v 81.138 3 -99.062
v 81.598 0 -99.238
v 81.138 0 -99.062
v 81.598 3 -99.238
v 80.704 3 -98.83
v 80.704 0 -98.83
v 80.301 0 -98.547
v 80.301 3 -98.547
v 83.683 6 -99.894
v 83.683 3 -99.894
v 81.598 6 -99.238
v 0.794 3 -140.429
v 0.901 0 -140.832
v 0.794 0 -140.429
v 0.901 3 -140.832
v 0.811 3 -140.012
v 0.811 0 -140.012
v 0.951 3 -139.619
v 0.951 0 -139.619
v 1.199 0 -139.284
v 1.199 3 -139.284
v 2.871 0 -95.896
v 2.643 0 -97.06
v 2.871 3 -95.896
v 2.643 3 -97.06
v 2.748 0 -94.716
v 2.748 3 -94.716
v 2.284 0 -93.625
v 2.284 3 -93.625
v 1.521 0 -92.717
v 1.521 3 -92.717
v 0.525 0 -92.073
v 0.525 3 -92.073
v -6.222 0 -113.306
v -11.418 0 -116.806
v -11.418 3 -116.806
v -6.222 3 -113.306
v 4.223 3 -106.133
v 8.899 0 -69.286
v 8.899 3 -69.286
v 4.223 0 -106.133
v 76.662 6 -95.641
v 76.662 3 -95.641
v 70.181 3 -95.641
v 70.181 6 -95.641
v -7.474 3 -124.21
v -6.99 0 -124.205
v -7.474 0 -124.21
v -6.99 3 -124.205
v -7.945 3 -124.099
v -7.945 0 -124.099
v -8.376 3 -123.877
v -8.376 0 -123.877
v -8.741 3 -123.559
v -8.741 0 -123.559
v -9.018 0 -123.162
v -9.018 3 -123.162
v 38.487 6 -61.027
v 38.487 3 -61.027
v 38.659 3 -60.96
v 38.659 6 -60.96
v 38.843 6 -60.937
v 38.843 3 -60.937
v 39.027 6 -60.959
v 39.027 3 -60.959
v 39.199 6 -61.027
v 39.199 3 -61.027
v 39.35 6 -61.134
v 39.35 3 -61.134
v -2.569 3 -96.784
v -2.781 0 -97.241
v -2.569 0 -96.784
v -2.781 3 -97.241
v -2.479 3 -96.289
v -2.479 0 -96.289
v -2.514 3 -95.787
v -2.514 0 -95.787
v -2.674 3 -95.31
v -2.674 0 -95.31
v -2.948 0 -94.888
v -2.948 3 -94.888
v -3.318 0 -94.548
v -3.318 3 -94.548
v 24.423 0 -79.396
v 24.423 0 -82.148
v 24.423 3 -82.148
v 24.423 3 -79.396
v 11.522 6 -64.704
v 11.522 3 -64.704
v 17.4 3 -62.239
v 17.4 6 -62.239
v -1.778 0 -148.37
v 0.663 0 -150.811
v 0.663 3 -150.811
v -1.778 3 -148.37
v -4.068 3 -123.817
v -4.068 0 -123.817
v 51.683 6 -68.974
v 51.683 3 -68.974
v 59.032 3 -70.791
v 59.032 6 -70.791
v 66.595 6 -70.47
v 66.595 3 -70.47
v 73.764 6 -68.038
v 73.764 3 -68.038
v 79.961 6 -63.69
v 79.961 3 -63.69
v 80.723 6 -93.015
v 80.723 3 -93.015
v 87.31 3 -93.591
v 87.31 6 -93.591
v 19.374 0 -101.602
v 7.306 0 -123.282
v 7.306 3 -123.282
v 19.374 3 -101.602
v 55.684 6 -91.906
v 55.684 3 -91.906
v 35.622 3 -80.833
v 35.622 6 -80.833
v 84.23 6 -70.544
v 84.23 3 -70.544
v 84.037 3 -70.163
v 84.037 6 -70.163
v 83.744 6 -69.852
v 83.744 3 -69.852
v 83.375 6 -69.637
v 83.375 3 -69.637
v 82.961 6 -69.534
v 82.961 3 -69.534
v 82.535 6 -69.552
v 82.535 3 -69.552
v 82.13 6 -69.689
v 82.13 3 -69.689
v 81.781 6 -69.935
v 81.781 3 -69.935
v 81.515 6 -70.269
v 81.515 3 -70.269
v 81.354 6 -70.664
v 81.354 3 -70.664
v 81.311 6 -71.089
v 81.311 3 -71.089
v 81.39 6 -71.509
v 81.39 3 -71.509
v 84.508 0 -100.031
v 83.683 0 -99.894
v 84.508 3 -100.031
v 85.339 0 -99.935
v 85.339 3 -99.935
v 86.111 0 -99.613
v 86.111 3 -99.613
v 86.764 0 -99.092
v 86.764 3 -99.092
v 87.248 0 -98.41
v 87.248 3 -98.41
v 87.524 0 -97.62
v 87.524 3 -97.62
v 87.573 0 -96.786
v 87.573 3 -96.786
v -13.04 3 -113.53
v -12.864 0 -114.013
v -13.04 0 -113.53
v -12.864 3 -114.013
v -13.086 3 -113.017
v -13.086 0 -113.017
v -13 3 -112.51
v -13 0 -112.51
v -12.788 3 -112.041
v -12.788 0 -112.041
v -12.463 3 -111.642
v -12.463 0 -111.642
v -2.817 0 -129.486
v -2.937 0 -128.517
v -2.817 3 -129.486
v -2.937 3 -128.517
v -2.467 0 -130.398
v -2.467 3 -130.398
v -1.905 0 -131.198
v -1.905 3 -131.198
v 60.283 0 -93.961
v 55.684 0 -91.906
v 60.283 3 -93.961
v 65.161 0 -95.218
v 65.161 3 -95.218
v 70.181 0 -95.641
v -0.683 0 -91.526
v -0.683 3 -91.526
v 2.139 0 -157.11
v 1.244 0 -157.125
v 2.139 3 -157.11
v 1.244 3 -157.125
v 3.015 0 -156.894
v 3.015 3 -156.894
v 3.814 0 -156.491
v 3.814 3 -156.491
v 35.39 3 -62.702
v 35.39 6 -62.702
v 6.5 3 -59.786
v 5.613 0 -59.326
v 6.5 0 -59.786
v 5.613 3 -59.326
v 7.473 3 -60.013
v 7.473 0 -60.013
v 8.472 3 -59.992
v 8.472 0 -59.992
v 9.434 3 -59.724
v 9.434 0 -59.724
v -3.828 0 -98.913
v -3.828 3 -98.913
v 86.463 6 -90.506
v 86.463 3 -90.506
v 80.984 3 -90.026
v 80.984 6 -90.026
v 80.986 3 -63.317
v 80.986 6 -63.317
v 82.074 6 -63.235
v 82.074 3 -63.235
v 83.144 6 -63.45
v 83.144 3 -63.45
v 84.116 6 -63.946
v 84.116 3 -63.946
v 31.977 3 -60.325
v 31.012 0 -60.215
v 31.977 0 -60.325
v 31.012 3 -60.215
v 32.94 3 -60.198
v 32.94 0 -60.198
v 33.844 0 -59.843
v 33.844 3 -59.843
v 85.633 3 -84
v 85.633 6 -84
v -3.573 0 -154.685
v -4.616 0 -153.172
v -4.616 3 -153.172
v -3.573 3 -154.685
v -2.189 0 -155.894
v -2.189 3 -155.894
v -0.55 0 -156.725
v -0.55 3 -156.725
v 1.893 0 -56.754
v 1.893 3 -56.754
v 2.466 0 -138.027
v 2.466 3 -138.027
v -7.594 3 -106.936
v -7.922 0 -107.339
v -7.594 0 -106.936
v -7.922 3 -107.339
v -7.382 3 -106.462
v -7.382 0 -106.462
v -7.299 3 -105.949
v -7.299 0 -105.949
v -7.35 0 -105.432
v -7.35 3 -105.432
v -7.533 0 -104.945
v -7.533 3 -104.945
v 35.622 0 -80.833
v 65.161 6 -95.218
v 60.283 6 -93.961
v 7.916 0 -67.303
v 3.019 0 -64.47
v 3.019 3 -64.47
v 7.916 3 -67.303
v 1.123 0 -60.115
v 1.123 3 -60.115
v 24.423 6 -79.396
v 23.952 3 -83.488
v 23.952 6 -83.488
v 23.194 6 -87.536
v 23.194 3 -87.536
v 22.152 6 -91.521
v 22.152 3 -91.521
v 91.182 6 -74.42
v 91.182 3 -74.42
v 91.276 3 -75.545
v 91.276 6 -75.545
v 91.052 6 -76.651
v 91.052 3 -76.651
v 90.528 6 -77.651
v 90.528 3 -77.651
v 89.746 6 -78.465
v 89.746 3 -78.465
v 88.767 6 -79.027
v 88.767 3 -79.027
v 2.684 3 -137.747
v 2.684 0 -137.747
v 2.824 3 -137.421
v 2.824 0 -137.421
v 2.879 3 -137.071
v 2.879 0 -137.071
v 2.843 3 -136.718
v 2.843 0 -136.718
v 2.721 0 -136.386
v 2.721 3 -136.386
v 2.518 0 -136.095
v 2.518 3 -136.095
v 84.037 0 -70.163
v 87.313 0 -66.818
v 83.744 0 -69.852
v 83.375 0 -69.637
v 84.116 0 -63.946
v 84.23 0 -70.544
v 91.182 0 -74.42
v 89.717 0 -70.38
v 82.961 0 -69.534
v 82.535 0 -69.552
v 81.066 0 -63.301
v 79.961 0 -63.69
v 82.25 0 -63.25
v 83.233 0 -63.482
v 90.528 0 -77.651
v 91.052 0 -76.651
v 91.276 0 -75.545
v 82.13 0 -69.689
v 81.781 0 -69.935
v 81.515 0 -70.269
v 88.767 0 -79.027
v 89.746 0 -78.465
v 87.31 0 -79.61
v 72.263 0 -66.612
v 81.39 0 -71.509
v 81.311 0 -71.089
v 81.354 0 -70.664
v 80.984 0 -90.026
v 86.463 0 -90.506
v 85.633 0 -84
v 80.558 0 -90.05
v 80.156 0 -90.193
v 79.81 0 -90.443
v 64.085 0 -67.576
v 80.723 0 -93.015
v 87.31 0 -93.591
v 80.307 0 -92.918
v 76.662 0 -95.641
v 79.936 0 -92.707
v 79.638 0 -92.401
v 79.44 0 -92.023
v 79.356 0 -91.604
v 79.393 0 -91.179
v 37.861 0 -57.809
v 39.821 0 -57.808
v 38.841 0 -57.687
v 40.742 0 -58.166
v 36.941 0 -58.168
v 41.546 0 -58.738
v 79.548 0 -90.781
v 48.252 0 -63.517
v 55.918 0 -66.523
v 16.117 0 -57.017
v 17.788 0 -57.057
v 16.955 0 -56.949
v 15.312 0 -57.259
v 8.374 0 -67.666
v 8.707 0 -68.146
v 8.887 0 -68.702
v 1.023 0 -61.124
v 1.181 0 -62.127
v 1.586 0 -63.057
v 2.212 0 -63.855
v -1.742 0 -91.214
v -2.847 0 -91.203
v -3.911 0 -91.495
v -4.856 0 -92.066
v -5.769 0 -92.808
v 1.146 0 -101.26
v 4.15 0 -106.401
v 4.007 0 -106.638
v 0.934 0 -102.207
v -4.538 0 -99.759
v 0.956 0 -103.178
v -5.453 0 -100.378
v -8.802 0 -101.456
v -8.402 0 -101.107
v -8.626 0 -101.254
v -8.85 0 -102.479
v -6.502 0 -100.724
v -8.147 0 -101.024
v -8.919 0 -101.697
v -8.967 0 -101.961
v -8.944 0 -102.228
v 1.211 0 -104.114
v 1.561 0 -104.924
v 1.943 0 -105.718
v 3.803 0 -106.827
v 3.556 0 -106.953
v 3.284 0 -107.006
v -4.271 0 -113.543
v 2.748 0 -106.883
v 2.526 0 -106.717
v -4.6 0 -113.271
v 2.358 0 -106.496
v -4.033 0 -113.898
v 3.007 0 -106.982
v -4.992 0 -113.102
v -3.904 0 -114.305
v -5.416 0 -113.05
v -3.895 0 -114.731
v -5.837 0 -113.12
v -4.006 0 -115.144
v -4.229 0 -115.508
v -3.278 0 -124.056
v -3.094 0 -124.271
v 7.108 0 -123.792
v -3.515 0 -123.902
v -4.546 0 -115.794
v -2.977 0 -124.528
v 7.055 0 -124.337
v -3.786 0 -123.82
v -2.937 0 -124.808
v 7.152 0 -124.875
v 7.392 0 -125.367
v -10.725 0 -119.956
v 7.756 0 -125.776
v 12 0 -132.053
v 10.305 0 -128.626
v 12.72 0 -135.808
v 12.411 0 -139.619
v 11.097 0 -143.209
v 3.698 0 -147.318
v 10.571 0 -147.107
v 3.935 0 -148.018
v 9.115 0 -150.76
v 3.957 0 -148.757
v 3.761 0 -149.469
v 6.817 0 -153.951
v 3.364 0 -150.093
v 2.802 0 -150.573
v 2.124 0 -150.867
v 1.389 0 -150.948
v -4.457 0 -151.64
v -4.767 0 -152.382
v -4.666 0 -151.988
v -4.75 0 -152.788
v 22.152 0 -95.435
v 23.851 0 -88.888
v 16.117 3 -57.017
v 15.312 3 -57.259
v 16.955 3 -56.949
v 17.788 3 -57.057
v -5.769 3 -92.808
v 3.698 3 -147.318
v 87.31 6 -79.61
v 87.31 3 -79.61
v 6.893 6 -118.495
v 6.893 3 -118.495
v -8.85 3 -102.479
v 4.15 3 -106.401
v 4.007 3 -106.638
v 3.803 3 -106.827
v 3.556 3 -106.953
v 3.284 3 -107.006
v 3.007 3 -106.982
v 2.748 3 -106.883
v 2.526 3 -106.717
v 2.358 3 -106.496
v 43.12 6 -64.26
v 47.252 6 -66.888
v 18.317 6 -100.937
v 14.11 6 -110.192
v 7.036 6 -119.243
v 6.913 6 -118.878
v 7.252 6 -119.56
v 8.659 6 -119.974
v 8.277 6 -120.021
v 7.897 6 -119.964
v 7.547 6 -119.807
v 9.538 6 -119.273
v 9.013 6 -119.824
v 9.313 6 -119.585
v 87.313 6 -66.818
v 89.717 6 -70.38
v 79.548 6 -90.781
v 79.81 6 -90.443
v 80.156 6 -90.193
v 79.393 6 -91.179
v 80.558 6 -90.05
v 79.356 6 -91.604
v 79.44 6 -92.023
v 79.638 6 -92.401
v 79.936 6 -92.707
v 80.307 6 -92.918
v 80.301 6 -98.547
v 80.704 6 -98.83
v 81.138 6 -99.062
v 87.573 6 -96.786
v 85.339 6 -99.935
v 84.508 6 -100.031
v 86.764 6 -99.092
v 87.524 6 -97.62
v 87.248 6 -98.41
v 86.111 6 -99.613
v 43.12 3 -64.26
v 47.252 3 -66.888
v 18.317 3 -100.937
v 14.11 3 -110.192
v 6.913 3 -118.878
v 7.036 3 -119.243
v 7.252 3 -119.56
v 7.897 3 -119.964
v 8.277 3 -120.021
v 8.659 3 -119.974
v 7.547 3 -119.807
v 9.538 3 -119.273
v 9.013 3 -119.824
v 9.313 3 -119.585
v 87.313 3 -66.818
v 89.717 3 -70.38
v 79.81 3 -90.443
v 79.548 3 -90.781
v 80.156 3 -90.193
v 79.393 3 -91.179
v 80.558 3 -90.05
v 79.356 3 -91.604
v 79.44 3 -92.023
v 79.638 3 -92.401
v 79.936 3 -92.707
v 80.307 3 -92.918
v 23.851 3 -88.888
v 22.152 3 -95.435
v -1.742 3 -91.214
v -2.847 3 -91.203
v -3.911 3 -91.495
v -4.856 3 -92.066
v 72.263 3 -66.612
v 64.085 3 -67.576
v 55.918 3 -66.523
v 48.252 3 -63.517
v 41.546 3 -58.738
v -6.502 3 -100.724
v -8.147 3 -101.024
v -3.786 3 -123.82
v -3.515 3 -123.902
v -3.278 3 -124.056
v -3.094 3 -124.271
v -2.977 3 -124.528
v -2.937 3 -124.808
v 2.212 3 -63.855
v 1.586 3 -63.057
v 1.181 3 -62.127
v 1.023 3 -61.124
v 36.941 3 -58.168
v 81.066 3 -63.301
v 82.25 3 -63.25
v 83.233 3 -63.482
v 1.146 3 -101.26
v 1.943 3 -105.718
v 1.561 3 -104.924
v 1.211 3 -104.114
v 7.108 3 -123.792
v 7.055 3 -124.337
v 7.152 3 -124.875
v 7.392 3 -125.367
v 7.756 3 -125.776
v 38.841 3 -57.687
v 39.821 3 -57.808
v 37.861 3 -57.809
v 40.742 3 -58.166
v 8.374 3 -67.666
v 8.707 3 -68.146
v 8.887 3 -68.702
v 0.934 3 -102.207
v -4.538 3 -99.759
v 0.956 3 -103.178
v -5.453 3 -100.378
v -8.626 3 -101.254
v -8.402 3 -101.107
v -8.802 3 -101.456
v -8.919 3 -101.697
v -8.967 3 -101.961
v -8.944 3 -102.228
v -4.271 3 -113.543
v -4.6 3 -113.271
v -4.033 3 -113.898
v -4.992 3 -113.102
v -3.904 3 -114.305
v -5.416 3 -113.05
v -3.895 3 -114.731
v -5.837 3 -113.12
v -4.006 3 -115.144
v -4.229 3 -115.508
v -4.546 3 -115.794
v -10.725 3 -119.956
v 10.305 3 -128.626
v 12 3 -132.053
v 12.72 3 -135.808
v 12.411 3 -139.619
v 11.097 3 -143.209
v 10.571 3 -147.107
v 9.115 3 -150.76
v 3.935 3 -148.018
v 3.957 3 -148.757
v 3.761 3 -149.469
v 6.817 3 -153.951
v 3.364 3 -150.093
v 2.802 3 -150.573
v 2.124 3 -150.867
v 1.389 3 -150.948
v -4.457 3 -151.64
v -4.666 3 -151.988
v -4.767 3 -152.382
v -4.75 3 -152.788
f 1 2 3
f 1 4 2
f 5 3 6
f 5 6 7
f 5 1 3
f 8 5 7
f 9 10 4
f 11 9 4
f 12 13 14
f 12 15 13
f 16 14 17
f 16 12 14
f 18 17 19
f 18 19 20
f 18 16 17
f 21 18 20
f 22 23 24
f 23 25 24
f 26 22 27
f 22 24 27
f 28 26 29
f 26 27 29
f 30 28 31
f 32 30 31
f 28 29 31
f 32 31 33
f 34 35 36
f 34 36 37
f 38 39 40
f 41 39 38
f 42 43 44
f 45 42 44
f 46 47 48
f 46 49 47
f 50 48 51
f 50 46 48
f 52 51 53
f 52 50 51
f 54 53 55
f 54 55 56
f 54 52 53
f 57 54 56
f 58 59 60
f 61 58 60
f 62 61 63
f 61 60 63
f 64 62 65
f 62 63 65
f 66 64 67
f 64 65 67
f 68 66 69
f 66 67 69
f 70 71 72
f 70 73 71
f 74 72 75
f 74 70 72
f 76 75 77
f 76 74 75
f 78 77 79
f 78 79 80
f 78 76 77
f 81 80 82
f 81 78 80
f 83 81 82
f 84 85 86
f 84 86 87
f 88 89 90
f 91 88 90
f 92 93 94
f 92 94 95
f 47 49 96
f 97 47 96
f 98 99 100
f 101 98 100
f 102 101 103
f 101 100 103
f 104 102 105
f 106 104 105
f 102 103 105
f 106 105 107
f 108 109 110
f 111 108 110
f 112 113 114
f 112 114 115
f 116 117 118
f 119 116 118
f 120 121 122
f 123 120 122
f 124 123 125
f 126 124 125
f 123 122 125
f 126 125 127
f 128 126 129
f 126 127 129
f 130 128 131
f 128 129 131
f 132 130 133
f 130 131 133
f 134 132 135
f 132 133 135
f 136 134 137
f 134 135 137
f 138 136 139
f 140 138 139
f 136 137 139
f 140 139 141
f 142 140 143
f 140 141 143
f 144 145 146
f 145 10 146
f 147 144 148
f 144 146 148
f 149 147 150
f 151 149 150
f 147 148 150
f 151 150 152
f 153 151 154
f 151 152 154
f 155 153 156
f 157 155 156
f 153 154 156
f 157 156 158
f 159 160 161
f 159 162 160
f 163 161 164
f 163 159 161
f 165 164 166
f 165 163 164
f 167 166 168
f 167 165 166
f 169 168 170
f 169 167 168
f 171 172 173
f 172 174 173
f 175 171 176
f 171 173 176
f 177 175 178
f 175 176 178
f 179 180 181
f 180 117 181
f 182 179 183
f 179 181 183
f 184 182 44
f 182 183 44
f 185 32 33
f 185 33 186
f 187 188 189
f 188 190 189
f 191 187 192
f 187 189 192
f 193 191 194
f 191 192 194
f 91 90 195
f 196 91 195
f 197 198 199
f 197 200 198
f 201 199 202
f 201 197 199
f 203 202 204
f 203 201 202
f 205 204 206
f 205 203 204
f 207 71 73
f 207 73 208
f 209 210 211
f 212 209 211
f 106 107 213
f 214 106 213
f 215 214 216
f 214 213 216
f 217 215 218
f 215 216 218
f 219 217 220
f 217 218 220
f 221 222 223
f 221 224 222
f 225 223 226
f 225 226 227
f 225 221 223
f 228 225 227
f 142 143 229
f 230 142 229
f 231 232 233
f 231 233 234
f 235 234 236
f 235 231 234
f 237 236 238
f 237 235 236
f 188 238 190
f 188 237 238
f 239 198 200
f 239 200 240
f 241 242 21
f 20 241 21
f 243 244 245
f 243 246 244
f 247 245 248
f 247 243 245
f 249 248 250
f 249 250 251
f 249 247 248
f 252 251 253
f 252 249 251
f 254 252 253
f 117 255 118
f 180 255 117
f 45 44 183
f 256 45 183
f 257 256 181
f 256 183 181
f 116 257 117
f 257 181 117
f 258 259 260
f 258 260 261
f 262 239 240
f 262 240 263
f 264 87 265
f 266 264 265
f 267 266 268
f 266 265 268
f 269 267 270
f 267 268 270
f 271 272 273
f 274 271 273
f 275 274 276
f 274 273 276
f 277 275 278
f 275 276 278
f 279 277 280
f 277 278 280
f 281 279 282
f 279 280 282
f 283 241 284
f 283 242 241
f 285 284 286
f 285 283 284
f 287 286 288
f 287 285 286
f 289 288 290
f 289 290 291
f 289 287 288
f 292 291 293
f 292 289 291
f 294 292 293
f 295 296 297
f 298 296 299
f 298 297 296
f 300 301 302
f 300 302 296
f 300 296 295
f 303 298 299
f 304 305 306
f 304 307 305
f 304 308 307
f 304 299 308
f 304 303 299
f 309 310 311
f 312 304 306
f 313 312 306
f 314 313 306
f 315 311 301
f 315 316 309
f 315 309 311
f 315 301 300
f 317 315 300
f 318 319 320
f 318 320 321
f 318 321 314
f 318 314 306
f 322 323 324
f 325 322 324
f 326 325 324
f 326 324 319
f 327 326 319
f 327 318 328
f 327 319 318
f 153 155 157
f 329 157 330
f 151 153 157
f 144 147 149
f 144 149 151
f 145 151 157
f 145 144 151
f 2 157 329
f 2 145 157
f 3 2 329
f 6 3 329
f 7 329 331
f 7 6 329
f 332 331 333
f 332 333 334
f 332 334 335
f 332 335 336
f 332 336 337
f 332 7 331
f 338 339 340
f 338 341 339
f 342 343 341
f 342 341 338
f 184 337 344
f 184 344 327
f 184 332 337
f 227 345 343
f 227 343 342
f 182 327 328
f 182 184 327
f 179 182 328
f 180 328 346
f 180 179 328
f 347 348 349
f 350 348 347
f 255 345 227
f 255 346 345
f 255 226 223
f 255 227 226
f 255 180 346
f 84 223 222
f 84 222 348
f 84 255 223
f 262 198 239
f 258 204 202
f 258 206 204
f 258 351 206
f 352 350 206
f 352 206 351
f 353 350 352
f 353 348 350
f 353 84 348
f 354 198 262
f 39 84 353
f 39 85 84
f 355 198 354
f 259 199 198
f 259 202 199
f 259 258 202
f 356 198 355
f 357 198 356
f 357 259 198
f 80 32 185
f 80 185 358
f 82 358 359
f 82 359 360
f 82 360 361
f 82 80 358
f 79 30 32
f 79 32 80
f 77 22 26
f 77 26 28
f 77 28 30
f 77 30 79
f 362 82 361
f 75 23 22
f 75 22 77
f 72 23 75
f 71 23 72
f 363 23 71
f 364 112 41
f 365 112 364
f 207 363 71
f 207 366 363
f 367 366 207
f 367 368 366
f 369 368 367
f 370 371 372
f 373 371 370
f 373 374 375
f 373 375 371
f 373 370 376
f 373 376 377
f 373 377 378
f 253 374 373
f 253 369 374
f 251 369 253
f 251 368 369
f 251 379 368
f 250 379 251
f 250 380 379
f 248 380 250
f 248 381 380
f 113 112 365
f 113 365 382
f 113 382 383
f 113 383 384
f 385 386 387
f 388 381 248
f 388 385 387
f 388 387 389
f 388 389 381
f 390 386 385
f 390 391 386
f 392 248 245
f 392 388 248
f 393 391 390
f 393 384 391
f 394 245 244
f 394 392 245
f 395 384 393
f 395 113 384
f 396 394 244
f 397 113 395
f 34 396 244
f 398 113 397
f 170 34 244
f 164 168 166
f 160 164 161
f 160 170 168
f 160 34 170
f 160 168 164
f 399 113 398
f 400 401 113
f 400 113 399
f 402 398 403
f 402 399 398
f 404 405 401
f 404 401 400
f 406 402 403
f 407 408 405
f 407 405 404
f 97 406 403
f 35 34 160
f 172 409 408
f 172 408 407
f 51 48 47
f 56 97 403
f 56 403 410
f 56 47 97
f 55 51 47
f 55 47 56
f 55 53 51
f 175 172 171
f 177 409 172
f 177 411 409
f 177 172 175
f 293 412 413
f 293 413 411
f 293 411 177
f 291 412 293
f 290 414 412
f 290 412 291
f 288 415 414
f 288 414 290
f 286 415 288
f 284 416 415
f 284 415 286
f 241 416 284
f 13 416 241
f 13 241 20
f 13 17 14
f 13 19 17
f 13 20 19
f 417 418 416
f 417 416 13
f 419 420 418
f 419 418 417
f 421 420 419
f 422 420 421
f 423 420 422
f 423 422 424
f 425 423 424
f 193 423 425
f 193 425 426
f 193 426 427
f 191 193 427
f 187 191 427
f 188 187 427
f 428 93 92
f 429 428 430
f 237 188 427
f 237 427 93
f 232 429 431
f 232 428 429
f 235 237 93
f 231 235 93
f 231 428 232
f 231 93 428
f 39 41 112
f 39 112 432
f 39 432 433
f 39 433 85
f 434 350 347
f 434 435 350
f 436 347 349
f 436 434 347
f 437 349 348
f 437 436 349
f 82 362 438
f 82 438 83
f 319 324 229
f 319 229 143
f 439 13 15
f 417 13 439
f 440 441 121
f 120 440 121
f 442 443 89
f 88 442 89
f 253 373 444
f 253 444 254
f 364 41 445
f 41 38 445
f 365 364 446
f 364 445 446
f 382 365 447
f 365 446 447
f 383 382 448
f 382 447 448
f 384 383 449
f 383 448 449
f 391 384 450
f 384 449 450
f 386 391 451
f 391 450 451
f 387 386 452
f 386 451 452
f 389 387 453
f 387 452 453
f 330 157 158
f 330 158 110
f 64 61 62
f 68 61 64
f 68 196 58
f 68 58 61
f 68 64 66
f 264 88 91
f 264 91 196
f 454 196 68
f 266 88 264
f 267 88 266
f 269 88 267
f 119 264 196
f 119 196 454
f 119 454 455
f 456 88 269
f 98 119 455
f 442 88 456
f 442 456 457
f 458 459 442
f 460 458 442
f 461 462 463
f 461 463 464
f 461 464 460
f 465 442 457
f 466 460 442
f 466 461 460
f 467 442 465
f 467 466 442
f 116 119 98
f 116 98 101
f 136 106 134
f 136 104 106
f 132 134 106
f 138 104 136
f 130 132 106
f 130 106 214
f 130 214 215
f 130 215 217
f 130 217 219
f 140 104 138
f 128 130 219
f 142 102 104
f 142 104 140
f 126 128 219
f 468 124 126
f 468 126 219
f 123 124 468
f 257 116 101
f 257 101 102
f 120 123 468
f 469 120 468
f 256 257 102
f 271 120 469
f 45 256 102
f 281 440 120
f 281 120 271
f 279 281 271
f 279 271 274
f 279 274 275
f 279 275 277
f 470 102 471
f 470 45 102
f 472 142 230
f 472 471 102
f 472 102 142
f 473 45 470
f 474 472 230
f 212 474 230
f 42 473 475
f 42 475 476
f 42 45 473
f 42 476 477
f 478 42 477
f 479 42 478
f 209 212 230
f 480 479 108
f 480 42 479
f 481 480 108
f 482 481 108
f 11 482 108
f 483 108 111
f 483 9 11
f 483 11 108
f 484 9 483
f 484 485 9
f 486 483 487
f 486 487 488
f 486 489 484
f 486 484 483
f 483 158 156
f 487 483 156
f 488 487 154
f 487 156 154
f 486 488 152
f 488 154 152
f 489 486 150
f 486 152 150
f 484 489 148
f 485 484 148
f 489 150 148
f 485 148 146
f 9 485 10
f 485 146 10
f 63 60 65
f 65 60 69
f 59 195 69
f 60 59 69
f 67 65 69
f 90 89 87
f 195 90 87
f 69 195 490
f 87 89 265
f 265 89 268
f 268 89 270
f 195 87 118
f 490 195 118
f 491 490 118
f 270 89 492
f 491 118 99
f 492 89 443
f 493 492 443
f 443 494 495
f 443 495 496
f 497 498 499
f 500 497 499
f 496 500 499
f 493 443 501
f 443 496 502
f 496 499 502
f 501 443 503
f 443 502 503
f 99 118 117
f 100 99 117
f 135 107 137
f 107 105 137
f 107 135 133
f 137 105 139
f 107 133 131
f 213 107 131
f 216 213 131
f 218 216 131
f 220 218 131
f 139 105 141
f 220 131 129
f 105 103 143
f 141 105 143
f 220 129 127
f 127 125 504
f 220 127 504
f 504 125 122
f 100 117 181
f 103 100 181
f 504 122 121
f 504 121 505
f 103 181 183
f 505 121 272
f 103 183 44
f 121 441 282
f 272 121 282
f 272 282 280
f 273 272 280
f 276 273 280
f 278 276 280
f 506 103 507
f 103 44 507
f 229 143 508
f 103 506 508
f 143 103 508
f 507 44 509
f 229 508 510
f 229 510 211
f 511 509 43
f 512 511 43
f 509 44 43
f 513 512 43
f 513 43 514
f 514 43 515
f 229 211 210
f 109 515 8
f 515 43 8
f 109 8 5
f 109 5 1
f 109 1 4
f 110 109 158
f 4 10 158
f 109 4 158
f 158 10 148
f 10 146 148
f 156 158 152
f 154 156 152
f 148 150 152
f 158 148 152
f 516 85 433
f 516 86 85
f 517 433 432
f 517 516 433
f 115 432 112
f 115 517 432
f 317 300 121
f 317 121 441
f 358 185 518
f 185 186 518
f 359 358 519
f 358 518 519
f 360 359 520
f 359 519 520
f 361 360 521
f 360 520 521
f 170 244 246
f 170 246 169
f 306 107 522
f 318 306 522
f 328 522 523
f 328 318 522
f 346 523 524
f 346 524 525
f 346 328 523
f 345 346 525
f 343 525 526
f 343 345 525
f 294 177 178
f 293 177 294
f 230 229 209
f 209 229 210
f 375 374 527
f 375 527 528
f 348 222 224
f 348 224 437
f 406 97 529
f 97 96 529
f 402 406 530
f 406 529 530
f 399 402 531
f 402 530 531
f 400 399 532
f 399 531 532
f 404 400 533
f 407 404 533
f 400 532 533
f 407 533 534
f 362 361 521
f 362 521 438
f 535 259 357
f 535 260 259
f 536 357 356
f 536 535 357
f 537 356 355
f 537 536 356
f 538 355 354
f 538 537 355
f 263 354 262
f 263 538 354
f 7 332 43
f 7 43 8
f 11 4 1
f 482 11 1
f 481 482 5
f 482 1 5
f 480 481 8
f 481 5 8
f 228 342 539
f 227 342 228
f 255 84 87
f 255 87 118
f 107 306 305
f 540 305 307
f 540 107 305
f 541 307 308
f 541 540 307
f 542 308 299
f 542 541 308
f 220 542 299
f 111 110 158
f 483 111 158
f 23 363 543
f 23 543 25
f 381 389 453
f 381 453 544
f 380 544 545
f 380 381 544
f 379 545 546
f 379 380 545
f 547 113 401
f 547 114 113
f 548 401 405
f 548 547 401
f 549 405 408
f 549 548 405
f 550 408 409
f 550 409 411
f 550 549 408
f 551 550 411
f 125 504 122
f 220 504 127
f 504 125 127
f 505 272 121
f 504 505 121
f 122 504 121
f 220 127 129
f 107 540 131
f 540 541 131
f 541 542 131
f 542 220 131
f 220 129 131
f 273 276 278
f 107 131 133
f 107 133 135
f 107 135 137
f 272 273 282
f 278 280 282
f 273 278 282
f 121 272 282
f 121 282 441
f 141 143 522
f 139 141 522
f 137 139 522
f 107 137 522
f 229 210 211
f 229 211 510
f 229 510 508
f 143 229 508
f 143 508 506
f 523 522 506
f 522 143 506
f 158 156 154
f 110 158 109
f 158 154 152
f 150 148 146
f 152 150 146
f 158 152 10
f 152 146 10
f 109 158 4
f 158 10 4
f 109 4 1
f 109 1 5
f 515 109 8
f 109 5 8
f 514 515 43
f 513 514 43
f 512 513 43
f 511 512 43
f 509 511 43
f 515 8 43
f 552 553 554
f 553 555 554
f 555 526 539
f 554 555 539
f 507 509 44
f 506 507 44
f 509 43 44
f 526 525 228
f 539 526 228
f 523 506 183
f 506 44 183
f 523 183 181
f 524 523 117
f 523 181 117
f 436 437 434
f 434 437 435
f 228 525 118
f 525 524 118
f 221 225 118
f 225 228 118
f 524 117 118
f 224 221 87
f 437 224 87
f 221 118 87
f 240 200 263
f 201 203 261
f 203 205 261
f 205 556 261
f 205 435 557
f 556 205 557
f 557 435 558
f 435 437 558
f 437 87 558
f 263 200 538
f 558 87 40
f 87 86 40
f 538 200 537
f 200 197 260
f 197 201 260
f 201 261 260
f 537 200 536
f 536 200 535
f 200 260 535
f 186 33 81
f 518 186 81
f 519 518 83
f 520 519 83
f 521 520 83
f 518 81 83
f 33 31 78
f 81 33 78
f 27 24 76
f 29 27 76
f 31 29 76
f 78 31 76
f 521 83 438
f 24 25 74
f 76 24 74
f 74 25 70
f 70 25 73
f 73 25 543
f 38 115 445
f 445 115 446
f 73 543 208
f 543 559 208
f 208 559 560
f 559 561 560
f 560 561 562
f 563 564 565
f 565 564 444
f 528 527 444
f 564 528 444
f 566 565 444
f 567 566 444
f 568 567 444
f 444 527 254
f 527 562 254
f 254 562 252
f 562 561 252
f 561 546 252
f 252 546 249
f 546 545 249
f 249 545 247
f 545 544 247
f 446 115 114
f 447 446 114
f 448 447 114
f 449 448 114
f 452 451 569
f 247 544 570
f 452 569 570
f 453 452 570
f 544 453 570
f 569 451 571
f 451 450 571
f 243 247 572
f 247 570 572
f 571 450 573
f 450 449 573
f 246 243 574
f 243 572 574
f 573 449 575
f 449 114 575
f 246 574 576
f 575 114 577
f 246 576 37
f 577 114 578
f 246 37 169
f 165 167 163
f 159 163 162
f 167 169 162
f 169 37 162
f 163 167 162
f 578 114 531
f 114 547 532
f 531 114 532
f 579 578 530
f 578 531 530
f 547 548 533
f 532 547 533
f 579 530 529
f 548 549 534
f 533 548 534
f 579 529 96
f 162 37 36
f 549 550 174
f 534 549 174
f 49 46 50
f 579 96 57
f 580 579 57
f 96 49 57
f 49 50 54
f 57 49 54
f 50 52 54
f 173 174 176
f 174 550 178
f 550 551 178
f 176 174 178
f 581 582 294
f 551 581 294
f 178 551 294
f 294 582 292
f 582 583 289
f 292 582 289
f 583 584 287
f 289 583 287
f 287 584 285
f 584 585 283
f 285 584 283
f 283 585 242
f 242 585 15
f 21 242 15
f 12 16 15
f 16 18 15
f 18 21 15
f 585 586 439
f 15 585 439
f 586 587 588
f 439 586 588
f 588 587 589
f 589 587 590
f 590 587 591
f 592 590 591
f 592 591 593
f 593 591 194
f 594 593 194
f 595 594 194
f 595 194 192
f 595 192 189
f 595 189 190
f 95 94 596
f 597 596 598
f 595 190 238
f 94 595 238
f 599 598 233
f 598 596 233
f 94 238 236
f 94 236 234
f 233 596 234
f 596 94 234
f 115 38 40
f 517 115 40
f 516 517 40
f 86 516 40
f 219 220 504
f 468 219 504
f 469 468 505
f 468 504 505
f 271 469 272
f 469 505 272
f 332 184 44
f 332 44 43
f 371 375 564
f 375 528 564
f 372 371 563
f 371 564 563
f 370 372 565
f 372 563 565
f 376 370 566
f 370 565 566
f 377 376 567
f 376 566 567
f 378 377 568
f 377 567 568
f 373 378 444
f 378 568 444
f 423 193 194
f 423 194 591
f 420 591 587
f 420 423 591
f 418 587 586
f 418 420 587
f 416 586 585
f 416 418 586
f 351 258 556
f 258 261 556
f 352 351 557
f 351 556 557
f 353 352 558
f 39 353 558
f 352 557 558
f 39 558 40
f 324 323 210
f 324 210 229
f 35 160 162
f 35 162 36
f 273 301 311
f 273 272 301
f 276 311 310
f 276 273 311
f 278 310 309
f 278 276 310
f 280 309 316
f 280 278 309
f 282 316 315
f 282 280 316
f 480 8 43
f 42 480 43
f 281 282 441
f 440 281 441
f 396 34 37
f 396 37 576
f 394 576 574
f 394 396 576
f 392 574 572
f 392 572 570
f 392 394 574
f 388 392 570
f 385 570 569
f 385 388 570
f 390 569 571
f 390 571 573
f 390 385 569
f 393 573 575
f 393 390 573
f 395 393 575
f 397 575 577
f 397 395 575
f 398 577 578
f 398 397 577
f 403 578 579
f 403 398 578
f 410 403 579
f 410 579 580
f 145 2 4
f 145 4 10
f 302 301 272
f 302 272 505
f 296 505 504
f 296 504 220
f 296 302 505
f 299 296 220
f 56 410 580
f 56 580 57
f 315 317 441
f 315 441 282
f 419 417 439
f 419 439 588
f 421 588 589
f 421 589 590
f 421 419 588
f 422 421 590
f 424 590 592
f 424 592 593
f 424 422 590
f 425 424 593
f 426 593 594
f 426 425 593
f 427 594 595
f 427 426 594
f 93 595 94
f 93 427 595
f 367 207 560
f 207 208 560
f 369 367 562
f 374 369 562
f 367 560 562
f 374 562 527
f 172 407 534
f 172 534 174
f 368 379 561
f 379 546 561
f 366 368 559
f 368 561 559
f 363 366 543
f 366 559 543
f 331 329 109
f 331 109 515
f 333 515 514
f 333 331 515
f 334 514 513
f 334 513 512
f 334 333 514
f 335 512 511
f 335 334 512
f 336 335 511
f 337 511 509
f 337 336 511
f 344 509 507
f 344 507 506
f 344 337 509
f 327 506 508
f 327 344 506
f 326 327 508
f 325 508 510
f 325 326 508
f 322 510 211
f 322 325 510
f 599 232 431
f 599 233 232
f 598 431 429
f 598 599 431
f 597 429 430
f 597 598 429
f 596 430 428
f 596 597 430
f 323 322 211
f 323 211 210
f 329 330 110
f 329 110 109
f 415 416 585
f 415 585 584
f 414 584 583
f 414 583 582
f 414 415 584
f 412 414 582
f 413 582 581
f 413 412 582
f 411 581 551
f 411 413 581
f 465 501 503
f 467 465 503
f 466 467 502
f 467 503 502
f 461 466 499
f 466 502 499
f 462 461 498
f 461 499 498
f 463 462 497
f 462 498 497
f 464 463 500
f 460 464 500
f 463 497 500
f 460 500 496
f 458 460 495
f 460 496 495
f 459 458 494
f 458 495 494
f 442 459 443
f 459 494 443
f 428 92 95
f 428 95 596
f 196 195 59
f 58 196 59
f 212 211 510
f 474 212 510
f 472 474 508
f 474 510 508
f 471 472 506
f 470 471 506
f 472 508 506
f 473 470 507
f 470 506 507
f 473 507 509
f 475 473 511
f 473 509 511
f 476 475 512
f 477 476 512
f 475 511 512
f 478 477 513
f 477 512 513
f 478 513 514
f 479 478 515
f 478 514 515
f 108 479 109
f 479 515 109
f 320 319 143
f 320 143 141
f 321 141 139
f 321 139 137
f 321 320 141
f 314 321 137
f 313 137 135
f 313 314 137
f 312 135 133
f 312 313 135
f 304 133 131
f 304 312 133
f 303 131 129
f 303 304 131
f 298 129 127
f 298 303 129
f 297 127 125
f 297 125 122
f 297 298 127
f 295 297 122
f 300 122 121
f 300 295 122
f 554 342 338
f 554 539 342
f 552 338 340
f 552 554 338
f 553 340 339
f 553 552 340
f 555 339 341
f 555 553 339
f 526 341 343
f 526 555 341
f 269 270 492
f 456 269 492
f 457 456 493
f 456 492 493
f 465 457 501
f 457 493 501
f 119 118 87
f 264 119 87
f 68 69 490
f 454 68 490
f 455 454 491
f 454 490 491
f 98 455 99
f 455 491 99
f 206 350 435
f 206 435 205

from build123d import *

# Parameters (mm, degrees)
BOSS_EXTRUDE2_DEPTH = 3
FILLET1_R           = 1
FILLET2_R           = 4
FILLET3_R           = 40
FILLET4_R           = 2
FILLET5_R           = 1.4
FILLET6_R           = 30
FILLET7_R           = 3
BOSS_EXTRUDE3_DEPTH = 3


with BuildPart() as part:
    # Sketch4 → Boss-Extrude2 (new body)
    with BuildSketch(Plane(origin=(0, 0, 0), x_dir=(1, 0, 0), z_dir=(0, 1, 0))):
        with BuildLine():
            Line((87.31, 79.61), (91.618486592, 77.887634392))
            ThreePointArc((91.618486592, 77.887634392), (88.863922918, 68.889748023), (81.855760182, 62.61))
            ThreePointArc((81.855760182, 62.61), (59.656820918, 67.258748235), (39.555721251, 56.754008505))
            Line((39.555721251, 56.754008505), (32.499176634, 60.570465889))
            Line((32.499176634, 60.570465889), (16.517315238, 56.754008505))
            Line((16.517315238, 56.754008505), (7.414760931, 60.570465889))
            Line((7.414760931, 60.570465889), (1.892511031, 56.754008505))
            Line((1.892511031, 56.754008505), (0.46321022, 62.992365596))
            Line((0.46321022, 62.992365596), (9.066007765, 67.967785451))
            Line((9.066007765, 67.967785451), (3.879350061, 108.84040305))
            ThreePointArc((3.879350061, 108.84040305), (2.01611376, 105.85998951), (0.66321022, 102.615892348))
            Line((0.66321022, 102.615892348), (3.879350061, 93.591357519))
            Line((3.879350061, 93.591357519), (-2.93678978, 90.505813501))
            Line((-2.93678978, 90.505813501), (-5.768910997, 92.808331559))
            Line((-5.768910997, 92.808331559), (-1.778138145, 95.640627614))
            Line((-1.778138145, 95.640627614), (-4.765318246, 100.408264948))
            Line((-4.765318246, 100.408264948), (-9.496065378, 101.269350579))
            Line((-9.496065378, 101.269350579), (-6.815233616, 106.290541956))
            Line((-6.815233616, 106.290541956), (-13.555482626, 112.676963609))
            Line((-13.555482626, 112.676963609), (-11.418327461, 116.805813501))
            Line((-11.418327461, 116.805813501), (-6.221647651, 113.305813501))
            ThreePointArc((-6.221647651, 113.305813501), (-4.139581192, 113.712014511), (-4.545782202, 115.79408097))
            Line((-4.545782202, 115.79408097), (-10.724979751, 119.955813501))
            Line((-10.724979751, 119.955813501), (-8.365992616, 124.387469749))
            Line((-8.365992616, 124.387469749), (-2.93678978, 123.666991194))
            Line((-2.93678978, 123.666991194), (-2.93678978, 130.055848545))
            Line((-2.93678978, 130.055848545), (3.413077147, 137.08559026))
            Line((3.413077147, 137.08559026), (0.522809133, 139.95641446))
            Line((0.522809133, 139.95641446), (3.698074275, 147.318161123))
            ThreePointArc((3.698074275, 147.318161123), (3.364070449, 150.092913281), (0.66321022, 150.811357519))
            Line((0.66321022, 150.811357519), (-1.778138145, 148.370009154))
            Line((-1.778138145, 148.370009154), (-4.999762187, 152.301948586))
            ThreePointArc((-4.999762187, 152.301948586), (-1.941119995, 156.054428227), (2.78321022, 157.111357519))
            ThreePointArc((2.78321022, 157.111357519), (8.815996079, 151.282158066), (11.096791577, 143.209237691))
            ThreePointArc((11.096791577, 143.209237691), (12.311774437, 133.113784868), (6.46321022, 124.795813501))
            Line((6.46321022, 124.795813501), (24.42321022, 92.530161433))
            Line((24.42321022, 92.530161433), (24.42321022, 79.395813501))
            Line((24.42321022, 79.395813501), (35.622369927, 80.833234121))
            Line((35.622369927, 80.833234121), (62.451437904, 95.640627614))
            Line((62.451437904, 95.640627614), (76.661791259, 95.640627614))
            Line((76.661791259, 95.640627614), (80.884676882, 99.013707758))
            Line((80.884676882, 99.013707758), (87.938365698, 101.231357519))
            Line((87.938365698, 101.231357519), (87.31, 93.591357519))
            Line((87.31, 93.591357519), (80.722672152, 93.01504101))
            ThreePointArc((80.722672152, 93.01504101), (79.359113719, 91.390015348), (80.984139381, 90.026456915))
            Line((80.984139381, 90.026456915), (86.46321022, 90.505813501))
            Line((86.46321022, 90.505813501), (85.632866314, 84))
            Line((85.632866314, 84), (81.389705108, 71.508585308))
            ThreePointArc((81.389705108, 71.508585308), (82.327545423, 69.605835839), (84.230294892, 70.543676154))
            Line((84.230294892, 70.543676154), (87.31, 79.61))
        make_face()
    extrude(amount=BOSS_EXTRUDE2_DEPTH)

    # Fillet1
    fillet1_edges = [part.edges().sort_by_distance(p)[0] for p in [
        (3.879350061, 1.5, -108.84040305),
        (-9.496065378, 1.5, -101.269350579),
        (-2.93678978, 1.5, -123.666991194),
    ]]
    fillet(fillet1_edges, radius=FILLET1_R)

    # Fillet2
    fillet2_edges = [part.edges().sort_by_distance(p)[0] for p in [
        (39.555721251, 1.5, -56.754008505),
        (32.499176634, 1.5, -60.570465889),
        (16.517315238, 1.5, -56.754008505),
        (7.414760931, 1.5, -60.570465889),
        (0.46321022, 1.5, -62.992365596),
        (0.66321022, 1.5, -102.615892348),
        (3.879350061, 1.5, -93.591357519),
        (-2.93678978, 1.5, -90.505813501),
        (-4.765318246, 1.5, -100.408264948),
        (-2.93678978, 1.5, -130.055848545),
        (2.78321022, 1.5, -157.111357519),
        (80.884676882, 1.5, -99.013707758),
        (91.618486592, 1.5, -77.887634392),
        (81.855760182, 1.5, -62.61),
    ]]
    fillet(fillet2_edges, radius=FILLET2_R)

    # Fillet3
    fillet3_edges = [part.edges().sort_by_distance(p)[0] for p in [
        (24.42321022, 1.5, -92.530161433),
    ]]
    fillet(fillet3_edges, radius=FILLET3_R)

    # Fillet4
    fillet4_edges = [part.edges().sort_by_distance(p)[0] for p in [
        (9.066007765, 1.5, -67.967785451),
        (-1.778138145, 1.5, -95.640627614),
        (-6.815233616, 1.5, -106.290541956),
        (-13.555482626, 1.5, -112.676963609),
        (-8.365992616, 1.5, -124.387469749),
        (6.46321022, 1.5, -124.795813501),
    ]]
    fillet(fillet4_edges, radius=FILLET4_R)

    # Fillet5
    fillet5_edges = [part.edges().sort_by_distance(p)[0] for p in [
        (3.413077147, 1.5, -137.08559026),
        (0.522809133, 1.5, -139.95641446),
        (-4.999762187, 1.5, -152.301948586),
    ]]
    fillet(fillet5_edges, radius=FILLET5_R)

    # Fillet6
    fillet6_edges = [part.edges().sort_by_distance(p)[0] for p in [
        (62.451437904, 1.5, -95.640627614),
    ]]
    fillet(fillet6_edges, radius=FILLET6_R)

    # Fillet7
    fillet7_edges = [part.edges().sort_by_distance(p)[0] for p in [
        (87.938365698, 1.5, -101.231357519),
    ]]
    fillet(fillet7_edges, radius=FILLET7_R)


with BuildPart() as body_2:
    # Sketch5 → Boss-Extrude3 (new body)
    with BuildSketch(Plane(origin=(0, 3, 0), x_dir=(1, 0, 0), z_dir=(0, 1, 0))):
        with BuildLine():
            Line((87.31, 79.61), (84.230294892, 70.543676154))
            ThreePointArc((84.230294892, 70.543676154), (82.327545423, 69.605835839), (81.389705108, 71.508585308))
            Line((81.389705108, 71.508585308), (85.632866314, 84))
            Line((85.632866314, 84), (86.46321022, 90.505813501))
            Line((86.46321022, 90.505813501), (80.984139381, 90.026456915))
            ThreePointArc((80.984139381, 90.026456915), (79.359113719, 91.390015348), (80.722672152, 93.01504101))
            Line((80.722672152, 93.01504101), (87.31, 93.591357519))
            Line((87.31, 93.591357519), (87.572724876, 96.785704468))
            ThreePointArc((87.572724876, 96.785704468), (86.455459348, 99.375377321), (83.683054116, 99.893505658))
            Line((83.683054116, 99.893505658), (81.597540254, 99.23782897))
            ThreePointArc((81.597540254, 99.23782897), (80.917202257, 98.952625765), (80.300808738, 98.54733613))
            Line((80.300808738, 98.54733613), (76.661791259, 95.640627614))
            Line((76.661791259, 95.640627614), (70.18064804, 95.640627614))
            ThreePointArc((70.18064804, 95.640627614), (62.69586156, 94.691926575), (55.684463394, 91.905825704))
            Line((55.684463394, 91.905825704), (35.622369927, 80.833234121))
            Line((35.622369927, 80.833234121), (24.42321022, 79.395813501))
            ThreePointArc((24.42321022, 79.395813501), (23.608754268, 85.518438874), (22.151992942, 91.520748963))
            ThreePointArc((22.151992942, 91.520748963), (16.259725713, 105.585278319), (9.537592469, 119.272598135))
            ThreePointArc((9.537592469, 119.272598135), (7.897389311, 119.964377284), (6.893123557, 118.494589854))
            Line((6.893123557, 118.494589854), (11.522159273, 64.703771757))
            Line((11.522159273, 64.703771757), (17.400375916, 62.239192854))
            Line((17.400375916, 62.239192854), (35.390108767, 62.701811781))
            Line((35.390108767, 62.701811781), (38.486705756, 61.027050112))
            ThreePointArc((38.486705756, 61.027050112), (38.935574107, 60.942421204), (39.350288499, 61.133880915))
            ThreePointArc((39.350288499, 61.133880915), (45.144601659, 65.639230218), (51.683133982, 68.973871489))
            ThreePointArc((51.683133982, 68.973871489), (66.59541671, 70.470238781), (79.961069943, 63.689781208))
            ThreePointArc((79.961069943, 63.689781208), (82.074415622, 63.235042849), (84.115757484, 63.946337682))
            ThreePointArc((84.115757484, 63.946337682), (88.624490915, 68.52513407), (91.181739197, 74.42043175))
            ThreePointArc((91.181739197, 74.42043175), (90.825596234, 77.169883499), (88.767430757, 79.027375787))
            Line((88.767430757, 79.027375787), (87.31, 79.61))
        make_face()
    extrude(amount=BOSS_EXTRUDE3_DEPTH)


solid = Compound([part.part, body_2.part])
